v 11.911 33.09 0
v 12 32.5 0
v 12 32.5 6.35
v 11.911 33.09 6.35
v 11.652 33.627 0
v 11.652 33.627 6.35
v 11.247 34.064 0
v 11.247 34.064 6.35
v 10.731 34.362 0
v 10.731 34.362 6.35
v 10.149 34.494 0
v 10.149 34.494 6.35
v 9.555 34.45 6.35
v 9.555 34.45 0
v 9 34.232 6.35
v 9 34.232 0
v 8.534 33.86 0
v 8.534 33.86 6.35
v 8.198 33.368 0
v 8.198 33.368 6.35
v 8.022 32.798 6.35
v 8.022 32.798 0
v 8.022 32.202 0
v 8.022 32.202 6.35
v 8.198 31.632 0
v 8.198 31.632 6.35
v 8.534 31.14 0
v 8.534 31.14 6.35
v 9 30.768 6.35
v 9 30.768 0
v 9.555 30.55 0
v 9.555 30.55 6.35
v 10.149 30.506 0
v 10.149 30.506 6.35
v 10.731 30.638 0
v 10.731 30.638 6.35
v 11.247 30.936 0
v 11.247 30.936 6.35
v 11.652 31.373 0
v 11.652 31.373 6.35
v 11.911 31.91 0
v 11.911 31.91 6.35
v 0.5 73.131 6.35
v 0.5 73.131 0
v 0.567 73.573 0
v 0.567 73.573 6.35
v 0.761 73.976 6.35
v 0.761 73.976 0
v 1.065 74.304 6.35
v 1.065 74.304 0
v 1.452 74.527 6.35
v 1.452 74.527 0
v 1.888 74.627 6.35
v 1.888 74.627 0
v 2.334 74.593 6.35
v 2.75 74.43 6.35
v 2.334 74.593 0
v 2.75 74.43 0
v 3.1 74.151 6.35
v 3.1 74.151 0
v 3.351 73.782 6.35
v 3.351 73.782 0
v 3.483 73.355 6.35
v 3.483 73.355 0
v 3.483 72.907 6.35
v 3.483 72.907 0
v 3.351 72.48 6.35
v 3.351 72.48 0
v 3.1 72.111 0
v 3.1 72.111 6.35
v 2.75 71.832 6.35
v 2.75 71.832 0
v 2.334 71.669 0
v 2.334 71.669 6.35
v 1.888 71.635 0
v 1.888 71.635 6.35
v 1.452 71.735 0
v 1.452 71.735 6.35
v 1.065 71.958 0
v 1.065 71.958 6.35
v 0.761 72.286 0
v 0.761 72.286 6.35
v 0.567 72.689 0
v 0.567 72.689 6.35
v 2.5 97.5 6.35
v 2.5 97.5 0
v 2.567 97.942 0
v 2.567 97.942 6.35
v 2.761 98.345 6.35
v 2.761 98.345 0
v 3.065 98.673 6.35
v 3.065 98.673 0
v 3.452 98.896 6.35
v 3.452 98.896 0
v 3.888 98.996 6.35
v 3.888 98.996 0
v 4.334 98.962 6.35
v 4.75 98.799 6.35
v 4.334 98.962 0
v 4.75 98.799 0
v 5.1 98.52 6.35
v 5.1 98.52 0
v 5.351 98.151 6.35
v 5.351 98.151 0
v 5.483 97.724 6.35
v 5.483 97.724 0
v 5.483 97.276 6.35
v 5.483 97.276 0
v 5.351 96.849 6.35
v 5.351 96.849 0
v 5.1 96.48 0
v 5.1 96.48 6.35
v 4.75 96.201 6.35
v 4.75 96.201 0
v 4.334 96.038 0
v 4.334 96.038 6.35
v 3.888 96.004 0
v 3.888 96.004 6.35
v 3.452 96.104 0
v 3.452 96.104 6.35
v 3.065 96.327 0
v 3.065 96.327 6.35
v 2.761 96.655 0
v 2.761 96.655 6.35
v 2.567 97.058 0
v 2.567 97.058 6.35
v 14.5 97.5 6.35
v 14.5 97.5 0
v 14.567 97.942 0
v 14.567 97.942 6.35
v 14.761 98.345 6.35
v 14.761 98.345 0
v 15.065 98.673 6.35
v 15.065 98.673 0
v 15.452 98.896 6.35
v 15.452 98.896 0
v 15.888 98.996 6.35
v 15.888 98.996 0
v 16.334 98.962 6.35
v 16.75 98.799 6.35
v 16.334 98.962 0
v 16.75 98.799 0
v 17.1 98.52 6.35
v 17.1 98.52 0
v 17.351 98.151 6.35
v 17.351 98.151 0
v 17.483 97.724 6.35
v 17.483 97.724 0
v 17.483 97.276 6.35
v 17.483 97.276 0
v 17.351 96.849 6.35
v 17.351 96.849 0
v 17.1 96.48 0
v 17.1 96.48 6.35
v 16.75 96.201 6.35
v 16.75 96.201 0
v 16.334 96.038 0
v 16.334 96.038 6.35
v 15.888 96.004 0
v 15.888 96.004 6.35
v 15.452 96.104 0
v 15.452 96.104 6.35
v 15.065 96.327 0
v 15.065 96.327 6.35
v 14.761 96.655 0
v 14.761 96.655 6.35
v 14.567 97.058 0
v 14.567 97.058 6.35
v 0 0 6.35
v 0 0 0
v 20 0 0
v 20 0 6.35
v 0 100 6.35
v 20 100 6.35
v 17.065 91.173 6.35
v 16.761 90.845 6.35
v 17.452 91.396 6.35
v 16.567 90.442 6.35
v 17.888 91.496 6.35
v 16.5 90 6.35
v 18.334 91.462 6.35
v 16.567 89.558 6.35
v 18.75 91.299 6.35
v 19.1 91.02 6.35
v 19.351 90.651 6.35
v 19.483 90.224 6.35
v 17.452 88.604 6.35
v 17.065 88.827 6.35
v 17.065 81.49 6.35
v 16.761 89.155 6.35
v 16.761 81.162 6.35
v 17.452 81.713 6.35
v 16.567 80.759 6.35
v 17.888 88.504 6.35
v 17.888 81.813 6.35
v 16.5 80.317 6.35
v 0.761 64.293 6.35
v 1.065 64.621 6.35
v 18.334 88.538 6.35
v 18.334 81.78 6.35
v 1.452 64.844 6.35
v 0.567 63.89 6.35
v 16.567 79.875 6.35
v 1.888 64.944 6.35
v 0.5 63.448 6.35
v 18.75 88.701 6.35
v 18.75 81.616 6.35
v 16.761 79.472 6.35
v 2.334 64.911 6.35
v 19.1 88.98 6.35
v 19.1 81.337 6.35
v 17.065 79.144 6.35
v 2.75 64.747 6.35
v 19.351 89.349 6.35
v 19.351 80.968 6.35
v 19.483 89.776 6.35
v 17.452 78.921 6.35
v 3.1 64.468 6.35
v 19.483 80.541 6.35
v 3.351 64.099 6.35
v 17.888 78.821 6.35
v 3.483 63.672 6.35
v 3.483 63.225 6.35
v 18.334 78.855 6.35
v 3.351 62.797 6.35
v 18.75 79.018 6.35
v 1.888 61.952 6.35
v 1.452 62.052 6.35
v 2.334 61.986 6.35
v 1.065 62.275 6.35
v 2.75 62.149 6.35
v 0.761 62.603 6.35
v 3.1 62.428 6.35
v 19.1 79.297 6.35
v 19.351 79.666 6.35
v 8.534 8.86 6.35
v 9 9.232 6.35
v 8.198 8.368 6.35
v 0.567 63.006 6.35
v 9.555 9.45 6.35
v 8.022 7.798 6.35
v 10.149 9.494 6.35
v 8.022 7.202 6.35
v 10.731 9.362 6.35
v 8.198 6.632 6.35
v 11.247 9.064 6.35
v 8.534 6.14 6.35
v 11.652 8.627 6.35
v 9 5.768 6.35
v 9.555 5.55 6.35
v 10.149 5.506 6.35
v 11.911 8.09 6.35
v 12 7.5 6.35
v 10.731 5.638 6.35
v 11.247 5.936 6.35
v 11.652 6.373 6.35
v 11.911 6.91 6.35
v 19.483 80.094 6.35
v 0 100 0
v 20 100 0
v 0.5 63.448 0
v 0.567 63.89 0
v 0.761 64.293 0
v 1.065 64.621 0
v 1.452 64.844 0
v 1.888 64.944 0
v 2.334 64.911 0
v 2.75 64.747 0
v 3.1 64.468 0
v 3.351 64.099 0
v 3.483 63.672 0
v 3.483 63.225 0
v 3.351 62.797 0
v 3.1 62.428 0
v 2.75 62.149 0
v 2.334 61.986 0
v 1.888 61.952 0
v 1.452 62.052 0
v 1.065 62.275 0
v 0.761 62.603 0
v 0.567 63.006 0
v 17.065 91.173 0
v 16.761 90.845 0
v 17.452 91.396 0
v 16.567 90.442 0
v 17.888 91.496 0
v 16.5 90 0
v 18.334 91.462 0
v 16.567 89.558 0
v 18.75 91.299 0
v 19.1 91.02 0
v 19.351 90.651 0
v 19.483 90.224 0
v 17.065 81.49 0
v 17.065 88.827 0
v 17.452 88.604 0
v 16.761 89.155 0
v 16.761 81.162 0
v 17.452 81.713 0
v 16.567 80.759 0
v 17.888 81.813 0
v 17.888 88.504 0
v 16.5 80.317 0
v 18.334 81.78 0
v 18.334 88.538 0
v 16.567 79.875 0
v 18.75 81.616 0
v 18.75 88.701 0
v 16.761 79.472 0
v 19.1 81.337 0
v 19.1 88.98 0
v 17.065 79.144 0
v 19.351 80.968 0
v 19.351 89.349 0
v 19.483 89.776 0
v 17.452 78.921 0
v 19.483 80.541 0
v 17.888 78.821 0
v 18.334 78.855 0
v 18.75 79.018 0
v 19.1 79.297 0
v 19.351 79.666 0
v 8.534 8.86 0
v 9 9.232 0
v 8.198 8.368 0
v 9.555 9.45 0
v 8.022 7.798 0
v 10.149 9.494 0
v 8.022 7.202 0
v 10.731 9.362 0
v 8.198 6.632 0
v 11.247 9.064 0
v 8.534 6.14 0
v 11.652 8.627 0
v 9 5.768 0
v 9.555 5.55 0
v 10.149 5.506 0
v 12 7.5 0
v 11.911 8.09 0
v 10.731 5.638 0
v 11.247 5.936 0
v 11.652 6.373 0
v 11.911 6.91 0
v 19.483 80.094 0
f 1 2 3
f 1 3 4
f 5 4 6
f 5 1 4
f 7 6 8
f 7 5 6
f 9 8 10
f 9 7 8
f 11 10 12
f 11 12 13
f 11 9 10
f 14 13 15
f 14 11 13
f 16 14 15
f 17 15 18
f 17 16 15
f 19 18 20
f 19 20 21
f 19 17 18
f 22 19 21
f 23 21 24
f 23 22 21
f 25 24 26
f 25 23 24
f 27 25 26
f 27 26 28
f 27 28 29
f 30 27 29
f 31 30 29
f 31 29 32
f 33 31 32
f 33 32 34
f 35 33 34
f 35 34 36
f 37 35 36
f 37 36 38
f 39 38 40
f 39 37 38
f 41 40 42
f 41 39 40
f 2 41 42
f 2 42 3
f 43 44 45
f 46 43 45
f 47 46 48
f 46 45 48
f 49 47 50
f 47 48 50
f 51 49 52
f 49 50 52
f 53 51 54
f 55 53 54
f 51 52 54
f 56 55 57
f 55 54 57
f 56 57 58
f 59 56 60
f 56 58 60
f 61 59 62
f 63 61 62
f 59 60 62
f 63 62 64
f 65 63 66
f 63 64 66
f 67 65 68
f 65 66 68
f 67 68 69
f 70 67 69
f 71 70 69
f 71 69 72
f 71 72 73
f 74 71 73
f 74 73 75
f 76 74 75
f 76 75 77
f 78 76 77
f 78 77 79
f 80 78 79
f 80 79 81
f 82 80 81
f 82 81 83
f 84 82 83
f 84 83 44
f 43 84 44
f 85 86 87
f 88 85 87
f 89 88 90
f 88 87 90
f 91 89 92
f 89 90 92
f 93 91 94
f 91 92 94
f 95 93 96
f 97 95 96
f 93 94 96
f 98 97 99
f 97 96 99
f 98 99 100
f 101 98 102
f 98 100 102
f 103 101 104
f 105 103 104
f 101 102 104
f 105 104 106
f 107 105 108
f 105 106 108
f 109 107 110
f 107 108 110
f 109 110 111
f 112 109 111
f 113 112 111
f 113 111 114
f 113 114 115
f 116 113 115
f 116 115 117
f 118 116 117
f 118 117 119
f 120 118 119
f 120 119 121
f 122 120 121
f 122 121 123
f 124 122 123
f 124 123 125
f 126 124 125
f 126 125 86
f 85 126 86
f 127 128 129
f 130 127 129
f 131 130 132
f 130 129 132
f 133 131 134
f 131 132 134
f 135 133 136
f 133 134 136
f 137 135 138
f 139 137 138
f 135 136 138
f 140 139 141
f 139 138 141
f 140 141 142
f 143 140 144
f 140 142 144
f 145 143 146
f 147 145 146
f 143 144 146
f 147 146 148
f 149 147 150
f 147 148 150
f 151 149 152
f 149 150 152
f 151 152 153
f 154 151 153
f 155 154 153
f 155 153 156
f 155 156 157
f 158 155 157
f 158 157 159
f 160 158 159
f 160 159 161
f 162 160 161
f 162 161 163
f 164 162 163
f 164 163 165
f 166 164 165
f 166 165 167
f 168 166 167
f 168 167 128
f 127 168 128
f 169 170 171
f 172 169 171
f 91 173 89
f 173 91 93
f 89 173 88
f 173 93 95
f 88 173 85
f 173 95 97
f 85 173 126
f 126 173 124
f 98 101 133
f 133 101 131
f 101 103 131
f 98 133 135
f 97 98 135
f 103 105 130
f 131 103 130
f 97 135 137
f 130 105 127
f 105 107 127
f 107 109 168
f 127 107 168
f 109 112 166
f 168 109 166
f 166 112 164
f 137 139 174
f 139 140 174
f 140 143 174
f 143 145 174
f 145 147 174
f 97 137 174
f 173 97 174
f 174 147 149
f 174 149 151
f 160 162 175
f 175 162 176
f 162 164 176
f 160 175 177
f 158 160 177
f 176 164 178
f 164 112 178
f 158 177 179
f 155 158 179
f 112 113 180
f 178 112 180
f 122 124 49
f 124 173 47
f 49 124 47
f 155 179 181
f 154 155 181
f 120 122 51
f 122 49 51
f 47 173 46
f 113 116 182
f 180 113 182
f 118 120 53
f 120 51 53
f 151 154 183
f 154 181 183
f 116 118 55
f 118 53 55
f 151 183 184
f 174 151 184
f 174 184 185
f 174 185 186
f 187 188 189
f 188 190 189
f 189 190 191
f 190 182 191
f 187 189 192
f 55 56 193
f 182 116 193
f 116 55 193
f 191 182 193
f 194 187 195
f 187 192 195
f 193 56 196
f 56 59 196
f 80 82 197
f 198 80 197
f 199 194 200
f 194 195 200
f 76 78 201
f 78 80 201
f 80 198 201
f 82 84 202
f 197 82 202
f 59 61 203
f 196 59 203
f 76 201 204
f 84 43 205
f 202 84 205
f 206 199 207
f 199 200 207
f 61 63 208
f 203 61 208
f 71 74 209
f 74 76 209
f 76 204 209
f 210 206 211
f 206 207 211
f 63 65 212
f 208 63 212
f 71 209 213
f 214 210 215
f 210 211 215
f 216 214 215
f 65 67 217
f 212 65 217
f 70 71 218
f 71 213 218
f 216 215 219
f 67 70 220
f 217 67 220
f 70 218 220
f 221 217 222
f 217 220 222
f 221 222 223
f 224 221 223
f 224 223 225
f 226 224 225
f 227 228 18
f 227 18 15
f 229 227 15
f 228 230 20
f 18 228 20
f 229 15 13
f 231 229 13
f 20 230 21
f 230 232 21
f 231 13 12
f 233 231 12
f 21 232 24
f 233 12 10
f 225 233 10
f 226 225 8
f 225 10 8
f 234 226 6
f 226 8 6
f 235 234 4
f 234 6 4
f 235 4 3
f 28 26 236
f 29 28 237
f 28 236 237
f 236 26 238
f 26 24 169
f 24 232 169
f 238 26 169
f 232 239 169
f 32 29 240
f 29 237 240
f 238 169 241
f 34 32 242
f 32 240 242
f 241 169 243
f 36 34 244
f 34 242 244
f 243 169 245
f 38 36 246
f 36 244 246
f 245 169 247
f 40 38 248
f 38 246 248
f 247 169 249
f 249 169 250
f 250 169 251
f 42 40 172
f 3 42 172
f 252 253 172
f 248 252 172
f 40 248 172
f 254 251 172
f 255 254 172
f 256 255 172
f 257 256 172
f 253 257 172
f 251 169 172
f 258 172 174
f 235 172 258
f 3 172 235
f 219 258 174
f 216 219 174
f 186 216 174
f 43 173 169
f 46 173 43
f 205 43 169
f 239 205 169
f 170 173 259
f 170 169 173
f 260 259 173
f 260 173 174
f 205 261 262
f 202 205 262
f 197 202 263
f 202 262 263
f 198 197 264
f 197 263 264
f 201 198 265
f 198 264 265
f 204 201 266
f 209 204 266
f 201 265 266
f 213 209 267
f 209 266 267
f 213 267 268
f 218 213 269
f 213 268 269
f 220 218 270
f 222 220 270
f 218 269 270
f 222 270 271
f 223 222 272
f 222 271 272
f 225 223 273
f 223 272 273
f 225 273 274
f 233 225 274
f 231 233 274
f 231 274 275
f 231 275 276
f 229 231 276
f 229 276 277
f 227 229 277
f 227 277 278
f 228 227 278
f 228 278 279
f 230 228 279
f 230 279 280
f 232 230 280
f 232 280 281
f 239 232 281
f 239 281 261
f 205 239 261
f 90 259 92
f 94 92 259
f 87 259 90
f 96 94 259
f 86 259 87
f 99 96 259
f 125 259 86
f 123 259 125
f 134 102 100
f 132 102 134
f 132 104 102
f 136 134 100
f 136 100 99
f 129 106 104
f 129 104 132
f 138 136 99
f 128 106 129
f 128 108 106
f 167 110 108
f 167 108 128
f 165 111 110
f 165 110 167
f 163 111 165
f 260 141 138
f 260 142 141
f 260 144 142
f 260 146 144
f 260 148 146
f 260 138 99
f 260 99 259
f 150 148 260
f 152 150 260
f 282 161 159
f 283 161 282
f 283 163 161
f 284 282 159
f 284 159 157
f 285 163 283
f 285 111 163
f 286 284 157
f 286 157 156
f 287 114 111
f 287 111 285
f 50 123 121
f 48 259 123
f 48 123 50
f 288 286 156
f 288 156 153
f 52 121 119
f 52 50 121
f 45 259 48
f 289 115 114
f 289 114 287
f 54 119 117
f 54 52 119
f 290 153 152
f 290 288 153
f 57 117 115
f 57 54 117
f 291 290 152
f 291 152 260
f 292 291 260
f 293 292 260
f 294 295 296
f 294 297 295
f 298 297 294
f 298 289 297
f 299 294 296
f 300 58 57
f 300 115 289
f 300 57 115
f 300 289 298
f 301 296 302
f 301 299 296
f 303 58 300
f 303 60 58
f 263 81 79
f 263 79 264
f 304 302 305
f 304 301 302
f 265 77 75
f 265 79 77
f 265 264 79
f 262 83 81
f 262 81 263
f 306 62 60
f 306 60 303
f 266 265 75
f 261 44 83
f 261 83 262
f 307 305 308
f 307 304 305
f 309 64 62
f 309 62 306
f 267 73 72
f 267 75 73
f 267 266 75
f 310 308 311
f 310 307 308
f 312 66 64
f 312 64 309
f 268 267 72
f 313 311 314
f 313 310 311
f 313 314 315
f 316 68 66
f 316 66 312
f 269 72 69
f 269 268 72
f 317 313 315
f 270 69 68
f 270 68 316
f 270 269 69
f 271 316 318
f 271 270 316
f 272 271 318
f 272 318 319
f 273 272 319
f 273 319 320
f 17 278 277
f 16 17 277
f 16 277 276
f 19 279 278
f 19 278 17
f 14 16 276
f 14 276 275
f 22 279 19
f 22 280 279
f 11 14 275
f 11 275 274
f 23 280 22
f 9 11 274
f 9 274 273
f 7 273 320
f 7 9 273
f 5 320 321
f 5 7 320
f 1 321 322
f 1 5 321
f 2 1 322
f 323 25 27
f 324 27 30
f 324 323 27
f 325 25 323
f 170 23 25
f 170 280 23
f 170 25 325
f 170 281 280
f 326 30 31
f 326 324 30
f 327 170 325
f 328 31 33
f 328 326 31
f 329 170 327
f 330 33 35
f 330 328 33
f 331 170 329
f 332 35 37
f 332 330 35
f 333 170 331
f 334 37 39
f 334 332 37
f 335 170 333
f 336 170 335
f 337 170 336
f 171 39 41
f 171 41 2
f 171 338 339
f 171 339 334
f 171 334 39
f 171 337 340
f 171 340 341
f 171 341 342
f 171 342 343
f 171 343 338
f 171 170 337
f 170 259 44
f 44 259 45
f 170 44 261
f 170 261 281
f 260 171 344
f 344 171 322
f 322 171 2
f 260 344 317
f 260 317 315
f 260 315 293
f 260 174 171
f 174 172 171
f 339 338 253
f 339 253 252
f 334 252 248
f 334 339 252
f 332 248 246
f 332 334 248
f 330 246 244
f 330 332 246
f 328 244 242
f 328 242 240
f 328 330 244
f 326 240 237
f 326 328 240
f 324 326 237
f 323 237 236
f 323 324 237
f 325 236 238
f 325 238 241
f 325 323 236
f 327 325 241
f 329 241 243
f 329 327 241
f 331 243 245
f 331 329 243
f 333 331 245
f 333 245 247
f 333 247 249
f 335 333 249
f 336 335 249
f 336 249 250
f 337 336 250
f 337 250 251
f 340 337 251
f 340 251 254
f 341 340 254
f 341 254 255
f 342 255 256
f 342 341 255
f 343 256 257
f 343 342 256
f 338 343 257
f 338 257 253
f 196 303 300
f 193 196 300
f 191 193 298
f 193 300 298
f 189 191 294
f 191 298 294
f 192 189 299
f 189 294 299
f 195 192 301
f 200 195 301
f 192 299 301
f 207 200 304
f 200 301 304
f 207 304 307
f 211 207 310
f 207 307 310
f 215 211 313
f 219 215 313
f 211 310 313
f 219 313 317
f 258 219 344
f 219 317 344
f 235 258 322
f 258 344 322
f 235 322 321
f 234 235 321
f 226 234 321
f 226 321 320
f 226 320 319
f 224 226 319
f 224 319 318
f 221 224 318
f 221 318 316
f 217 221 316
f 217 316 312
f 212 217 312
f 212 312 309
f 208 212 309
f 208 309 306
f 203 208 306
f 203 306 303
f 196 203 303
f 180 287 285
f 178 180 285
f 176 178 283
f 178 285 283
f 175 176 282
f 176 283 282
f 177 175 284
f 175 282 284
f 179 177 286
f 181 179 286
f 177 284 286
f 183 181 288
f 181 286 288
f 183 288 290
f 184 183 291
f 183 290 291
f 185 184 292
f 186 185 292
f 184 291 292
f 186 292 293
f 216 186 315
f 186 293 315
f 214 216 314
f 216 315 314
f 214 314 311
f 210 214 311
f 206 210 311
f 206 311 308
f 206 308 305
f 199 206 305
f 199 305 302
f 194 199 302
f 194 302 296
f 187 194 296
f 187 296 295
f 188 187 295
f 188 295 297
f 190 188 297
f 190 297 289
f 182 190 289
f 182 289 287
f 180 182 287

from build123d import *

# Parameters (mm, degrees)
SKETCH1_W           = 20
SKETCH1_H           = 40
SKETCH1_R           = 2
BOSS_EXTRUDE1_DEPTH = 6.35
SKETCH3_W           = 20
SKETCH3_H           = 6.35
BOSS_EXTRUDE3_DEPTH = 60
SKETCH6_R           = 1.5
CUT_EXTRUDE1_DEPTH  = 23.2


with BuildPart() as part:
    # Sketch1 → Boss-Extrude1 (new body)
    with BuildSketch(Plane.XY):
        with Locations((10, 20)):
            Rectangle(SKETCH1_W, SKETCH1_H)
        with Locations((10, 32.5)):
            Circle(SKETCH1_R, mode=Mode.SUBTRACT)
        with Locations((10, 7.5)):
            Circle(SKETCH1_R, mode=Mode.SUBTRACT)
    extrude(amount=BOSS_EXTRUDE1_DEPTH)

    # Sketch3 → Boss-Extrude3 (add)
    with BuildSketch(Plane(origin=(0, 40, 0), x_dir=(1, 0, 0), z_dir=(0, 1, 0))):
        with Locations((10, -3.175)):
            Rectangle(SKETCH3_W, SKETCH3_H)
    extrude(amount=BOSS_EXTRUDE3_DEPTH)

    # Sketch6 → Cut-Extrude1 (cut)
    with BuildSketch(Plane(origin=(0, 0, 0), x_dir=(-1, 0, 0), z_dir=(0, 0, -1))):
        with Locations((-16, 97.5)):
            Circle(SKETCH6_R)
        with Locations((-4, 97.5)):
            Circle(SKETCH6_R)
        with Locations((-18, 90)):
            Circle(SKETCH6_R)
        with Locations((-2, 63.448163905)):
            Circle(SKETCH6_R)
        with Locations((-2, 73.131019592)):
            Circle(SKETCH6_R)
        with Locations((-18, 80.317144313)):
            Circle(SKETCH6_R)
    extrude(amount=-CUT_EXTRUDE1_DEPTH, mode=Mode.SUBTRACT)


solid = part.part
